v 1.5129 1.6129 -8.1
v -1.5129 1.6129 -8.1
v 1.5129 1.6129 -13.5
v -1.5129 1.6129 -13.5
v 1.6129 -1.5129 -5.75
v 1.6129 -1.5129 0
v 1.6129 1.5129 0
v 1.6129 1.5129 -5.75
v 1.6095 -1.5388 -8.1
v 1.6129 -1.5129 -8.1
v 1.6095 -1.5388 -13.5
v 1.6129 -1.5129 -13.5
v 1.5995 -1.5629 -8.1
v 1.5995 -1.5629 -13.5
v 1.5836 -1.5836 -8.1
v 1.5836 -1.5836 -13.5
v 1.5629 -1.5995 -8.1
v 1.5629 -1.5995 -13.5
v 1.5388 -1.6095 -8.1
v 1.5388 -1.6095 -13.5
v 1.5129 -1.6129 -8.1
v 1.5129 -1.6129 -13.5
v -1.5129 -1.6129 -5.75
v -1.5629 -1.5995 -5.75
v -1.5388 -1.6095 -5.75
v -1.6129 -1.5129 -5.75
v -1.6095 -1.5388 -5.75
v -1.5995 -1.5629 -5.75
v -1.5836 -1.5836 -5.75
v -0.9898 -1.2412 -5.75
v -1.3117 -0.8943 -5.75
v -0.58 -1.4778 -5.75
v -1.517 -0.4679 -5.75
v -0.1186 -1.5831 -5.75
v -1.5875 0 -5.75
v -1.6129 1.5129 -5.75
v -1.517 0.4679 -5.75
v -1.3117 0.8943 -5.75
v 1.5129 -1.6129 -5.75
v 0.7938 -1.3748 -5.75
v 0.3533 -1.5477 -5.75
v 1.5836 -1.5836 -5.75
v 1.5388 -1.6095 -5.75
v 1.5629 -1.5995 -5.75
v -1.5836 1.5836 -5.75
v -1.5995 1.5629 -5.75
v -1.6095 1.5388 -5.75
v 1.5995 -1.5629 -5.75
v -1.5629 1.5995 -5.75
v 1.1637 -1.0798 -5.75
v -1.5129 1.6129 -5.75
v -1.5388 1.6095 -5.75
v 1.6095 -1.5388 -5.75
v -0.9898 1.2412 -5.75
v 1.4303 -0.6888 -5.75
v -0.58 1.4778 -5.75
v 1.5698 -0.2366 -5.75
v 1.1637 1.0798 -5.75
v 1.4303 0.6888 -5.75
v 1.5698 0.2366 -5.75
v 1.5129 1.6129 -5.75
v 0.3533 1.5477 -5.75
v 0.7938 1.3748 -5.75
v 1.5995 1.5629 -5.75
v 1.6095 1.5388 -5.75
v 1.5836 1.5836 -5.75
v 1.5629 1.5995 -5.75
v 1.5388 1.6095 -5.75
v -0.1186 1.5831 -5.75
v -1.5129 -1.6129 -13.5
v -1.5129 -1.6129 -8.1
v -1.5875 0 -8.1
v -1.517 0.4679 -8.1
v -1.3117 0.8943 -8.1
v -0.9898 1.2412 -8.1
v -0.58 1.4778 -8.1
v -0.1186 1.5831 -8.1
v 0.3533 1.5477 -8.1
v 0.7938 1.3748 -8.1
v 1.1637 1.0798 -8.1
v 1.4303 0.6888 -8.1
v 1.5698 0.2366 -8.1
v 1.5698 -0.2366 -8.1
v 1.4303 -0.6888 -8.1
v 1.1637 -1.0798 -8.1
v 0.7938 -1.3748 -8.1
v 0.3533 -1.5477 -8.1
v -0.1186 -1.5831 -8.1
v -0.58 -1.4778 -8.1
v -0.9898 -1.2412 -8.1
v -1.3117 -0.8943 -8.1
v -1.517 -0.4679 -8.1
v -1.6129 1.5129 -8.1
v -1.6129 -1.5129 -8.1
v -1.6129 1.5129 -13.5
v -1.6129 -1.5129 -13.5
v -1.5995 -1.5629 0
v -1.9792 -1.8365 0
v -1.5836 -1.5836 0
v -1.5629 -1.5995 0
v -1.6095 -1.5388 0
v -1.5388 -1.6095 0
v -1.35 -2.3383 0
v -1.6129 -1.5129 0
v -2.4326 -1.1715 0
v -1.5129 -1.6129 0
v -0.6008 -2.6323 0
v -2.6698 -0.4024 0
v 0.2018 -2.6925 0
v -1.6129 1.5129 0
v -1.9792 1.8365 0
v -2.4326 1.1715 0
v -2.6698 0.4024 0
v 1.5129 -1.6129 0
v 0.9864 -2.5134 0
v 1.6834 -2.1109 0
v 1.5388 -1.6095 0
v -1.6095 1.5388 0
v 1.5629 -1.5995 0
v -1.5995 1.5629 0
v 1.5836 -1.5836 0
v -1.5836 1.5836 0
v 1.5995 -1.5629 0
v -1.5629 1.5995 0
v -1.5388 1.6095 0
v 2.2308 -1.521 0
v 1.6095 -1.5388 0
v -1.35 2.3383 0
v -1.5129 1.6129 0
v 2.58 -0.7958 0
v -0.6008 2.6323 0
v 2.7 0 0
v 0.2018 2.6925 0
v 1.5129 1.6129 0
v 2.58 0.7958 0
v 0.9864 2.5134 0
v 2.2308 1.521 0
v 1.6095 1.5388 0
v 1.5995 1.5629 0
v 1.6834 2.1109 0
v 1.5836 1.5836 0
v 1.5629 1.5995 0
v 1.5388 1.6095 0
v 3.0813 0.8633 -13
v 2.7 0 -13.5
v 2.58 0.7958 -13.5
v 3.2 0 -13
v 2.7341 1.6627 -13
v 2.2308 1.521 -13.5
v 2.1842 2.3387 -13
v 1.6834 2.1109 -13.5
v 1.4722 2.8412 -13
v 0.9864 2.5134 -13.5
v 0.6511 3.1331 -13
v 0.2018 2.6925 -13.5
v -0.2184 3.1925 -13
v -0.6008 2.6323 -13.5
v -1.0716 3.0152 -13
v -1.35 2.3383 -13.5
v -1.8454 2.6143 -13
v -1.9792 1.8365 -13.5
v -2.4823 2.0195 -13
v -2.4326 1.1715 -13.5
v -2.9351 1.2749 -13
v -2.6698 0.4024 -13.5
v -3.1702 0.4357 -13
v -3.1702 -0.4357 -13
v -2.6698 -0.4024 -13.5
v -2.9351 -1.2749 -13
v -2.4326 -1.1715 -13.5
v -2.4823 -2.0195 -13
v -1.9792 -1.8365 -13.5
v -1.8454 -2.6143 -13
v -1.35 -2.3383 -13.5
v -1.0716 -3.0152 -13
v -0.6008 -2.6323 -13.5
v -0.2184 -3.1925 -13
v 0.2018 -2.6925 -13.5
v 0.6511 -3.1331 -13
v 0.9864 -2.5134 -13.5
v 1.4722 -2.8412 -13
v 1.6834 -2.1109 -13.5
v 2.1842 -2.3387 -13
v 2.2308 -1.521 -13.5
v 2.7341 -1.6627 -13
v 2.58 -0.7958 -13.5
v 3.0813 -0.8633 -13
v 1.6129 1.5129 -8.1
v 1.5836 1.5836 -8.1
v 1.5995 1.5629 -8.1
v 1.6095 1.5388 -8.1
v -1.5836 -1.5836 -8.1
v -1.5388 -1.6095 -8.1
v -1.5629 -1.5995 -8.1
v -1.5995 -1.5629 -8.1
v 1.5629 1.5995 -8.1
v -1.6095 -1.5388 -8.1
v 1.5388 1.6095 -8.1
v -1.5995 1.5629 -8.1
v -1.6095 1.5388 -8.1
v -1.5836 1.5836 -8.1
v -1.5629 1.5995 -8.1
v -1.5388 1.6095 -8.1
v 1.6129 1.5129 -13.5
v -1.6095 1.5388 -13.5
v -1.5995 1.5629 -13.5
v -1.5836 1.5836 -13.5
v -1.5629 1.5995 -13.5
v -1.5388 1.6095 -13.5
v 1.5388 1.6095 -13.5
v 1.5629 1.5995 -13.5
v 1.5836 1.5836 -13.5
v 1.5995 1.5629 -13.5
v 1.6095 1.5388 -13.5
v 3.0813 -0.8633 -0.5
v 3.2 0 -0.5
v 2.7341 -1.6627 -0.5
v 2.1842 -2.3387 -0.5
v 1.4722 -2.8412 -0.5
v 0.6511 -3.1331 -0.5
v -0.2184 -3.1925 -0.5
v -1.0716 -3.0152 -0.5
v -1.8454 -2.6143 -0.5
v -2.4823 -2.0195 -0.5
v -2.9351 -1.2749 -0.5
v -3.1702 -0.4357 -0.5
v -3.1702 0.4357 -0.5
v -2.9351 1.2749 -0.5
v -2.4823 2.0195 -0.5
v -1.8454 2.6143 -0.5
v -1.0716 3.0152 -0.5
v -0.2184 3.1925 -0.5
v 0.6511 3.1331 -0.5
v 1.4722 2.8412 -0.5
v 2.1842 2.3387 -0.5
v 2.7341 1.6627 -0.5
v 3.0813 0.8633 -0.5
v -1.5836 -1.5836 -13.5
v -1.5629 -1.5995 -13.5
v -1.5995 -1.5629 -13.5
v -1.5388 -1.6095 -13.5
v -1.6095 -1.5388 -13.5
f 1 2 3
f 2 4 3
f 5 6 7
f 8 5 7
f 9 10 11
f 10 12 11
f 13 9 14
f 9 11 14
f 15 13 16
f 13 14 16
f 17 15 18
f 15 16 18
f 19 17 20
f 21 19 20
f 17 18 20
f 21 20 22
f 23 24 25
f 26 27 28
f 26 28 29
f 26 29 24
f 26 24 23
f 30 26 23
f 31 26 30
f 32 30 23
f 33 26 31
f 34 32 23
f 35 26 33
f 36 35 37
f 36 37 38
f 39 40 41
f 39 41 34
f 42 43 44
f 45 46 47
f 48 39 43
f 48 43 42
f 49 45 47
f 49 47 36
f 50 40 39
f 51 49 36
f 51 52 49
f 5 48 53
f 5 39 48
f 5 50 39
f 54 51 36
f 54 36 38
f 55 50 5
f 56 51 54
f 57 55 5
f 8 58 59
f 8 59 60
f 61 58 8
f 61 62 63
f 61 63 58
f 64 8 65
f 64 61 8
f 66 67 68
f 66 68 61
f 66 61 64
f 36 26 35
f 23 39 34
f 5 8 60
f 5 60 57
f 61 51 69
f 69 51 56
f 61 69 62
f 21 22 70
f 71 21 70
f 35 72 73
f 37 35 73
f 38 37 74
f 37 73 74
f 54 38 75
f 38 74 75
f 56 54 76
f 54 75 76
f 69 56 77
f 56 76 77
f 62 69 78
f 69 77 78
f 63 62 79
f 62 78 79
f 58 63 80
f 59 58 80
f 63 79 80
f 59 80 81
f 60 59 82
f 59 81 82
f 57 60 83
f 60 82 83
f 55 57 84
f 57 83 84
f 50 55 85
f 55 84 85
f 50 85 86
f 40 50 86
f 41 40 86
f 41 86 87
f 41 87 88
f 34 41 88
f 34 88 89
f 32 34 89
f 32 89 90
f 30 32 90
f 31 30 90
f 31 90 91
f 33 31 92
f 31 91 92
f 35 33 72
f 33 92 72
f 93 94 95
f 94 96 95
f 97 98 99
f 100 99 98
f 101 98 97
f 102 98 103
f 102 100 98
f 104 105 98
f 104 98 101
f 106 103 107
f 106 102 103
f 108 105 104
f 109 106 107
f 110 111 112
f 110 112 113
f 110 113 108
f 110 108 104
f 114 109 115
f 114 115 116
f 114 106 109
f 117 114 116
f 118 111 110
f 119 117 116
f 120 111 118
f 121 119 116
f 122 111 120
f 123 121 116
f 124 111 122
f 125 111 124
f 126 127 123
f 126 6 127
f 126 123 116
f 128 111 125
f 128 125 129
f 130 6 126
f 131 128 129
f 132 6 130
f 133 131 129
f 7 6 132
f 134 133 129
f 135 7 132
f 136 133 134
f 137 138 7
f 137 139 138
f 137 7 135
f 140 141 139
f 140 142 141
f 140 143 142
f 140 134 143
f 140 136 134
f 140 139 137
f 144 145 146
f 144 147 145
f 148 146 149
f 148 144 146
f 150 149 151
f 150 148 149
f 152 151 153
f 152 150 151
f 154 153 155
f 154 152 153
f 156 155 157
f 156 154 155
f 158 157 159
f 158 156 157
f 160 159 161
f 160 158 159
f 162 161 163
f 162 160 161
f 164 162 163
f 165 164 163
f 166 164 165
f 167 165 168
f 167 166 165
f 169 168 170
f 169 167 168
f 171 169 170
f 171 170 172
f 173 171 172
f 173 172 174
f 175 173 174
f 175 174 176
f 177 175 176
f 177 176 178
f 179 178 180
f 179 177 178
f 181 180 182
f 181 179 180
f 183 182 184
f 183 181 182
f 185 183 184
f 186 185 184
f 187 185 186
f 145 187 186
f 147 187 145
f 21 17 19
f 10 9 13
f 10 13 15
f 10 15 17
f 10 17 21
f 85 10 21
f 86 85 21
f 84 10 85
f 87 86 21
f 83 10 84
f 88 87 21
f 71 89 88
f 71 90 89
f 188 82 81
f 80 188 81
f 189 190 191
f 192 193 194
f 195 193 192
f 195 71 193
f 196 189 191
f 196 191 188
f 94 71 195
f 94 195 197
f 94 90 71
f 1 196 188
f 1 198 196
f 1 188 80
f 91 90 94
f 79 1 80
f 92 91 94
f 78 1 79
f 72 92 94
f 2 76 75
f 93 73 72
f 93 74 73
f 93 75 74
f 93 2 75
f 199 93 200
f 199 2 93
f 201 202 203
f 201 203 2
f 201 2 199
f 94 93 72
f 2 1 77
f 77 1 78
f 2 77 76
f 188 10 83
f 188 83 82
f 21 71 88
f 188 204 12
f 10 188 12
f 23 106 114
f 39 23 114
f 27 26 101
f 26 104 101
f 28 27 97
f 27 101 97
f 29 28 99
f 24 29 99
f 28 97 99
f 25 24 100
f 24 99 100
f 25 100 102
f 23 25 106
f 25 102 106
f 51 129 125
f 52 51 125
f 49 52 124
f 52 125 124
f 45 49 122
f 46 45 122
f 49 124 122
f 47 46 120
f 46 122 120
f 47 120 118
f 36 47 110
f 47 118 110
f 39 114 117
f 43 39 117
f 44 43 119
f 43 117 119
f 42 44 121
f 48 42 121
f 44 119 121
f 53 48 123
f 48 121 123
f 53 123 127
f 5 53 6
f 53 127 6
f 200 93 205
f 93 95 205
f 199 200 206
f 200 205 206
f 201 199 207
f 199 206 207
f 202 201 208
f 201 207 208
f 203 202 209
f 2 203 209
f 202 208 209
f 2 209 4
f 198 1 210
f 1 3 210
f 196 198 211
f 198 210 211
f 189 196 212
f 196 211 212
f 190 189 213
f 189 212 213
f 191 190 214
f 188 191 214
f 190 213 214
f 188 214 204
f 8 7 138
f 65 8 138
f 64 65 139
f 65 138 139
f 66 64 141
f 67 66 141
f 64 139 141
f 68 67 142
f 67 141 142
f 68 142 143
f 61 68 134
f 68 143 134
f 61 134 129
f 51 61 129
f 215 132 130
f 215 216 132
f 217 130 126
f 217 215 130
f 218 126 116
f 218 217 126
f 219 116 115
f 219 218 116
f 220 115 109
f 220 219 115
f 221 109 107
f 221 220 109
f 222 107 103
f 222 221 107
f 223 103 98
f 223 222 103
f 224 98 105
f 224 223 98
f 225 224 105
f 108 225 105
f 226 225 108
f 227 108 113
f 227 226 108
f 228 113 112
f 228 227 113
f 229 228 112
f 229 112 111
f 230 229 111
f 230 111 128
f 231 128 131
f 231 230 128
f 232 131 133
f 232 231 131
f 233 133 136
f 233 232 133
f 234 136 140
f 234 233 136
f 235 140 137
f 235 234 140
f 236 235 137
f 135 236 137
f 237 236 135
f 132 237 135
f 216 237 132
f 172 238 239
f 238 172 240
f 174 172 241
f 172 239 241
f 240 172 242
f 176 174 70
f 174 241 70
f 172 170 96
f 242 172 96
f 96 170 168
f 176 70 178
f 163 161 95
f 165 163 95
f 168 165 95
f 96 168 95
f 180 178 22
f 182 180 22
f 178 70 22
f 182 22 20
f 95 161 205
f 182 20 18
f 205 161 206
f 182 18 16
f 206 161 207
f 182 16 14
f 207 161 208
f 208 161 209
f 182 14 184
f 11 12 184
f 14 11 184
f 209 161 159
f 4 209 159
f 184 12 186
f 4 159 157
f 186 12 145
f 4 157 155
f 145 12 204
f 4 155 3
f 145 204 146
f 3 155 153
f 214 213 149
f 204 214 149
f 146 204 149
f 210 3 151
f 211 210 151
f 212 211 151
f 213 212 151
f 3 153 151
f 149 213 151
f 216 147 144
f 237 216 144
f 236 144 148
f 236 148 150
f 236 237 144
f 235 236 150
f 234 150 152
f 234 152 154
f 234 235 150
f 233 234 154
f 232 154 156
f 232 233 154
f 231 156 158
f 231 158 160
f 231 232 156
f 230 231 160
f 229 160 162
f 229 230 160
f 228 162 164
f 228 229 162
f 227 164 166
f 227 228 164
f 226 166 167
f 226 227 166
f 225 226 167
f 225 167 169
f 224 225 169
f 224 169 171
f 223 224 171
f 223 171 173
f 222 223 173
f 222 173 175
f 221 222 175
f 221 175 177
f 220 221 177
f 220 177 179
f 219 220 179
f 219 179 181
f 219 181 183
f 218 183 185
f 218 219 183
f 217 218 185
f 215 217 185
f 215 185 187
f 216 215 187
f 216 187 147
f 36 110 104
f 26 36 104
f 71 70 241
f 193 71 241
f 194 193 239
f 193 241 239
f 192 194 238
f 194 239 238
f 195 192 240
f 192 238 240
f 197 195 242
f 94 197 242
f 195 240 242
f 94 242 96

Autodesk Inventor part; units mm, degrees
ref_plane "YZ Plane" through (0, 0, 0) normal (1, 0, 0) x (0, 1, 0)
ref_plane "XZ Plane" through (0, 0, 0) normal (0, 1, 0) x (-1, 0, 0)
ref_plane "XY Plane" through (0, 0, 0) normal (0, 0, 1) x (1, 0, 0)
sketch "Sketch1" plane through (0, 0, 0) normal (0, 0, 1) x (1, 0, 0)
  circle A0 centre (0, 0) radius 3.2
  dimension "d0" = 6.4
extrude "Extrusion1" add sketch "Sketch1" against normal blind 13.5
sketch "Sketch2" plane through (0, 0, 0) normal (0, 0, 1) x (1, 0, 0)
  circle A0 centre (0, 0) radius 2.7
  line L0 (1.6129, -1.5129) -> (1.6129, 1.5129)
  arc A1 (1.5129, -1.6129) -> (1.6129, -1.5129) centre (1.5129, -1.5129) ccw
  line L1 (-1.5129, -1.6129) -> (1.5129, -1.6129)
  arc A2 (-1.6129, -1.5129) -> (-1.5129, -1.6129) centre (-1.5129, -1.5129) ccw
  line L2 (-1.6129, 1.5129) -> (-1.6129, -1.5129)
  arc A3 (-1.5129, 1.6129) -> (-1.6129, 1.5129) centre (-1.5129, 1.5129) ccw
  line L3 (1.5129, 1.6129) -> (-1.5129, 1.6129)
  arc A4 (1.6129, 1.5129) -> (1.5129, 1.6129) centre (1.5129, 1.5129) ccw
extrude "Extrusion2" cut sketch "Sketch2" against normal blind 5.75 contours A1 L1 A2 L2 A3 L3 A4 L0
sketch "Sketch3" plane through (0, 0, -13.5) normal (0, 0, -1) x (-1, 0, 0)
  circle A0 centre (0, 0) radius 2.7
  line L0 (1.6129, -1.5129) -> (1.6129, 1.5129)
  arc A1 (1.5129, -1.6129) -> (1.6129, -1.5129) centre (1.5129, -1.5129) ccw
  line L1 (-1.5129, -1.6129) -> (1.5129, -1.6129)
  arc A2 (-1.6129, -1.5129) -> (-1.5129, -1.6129) centre (-1.5129, -1.5129) ccw
  line L2 (-1.6129, 1.5129) -> (-1.6129, -1.5129)
  arc A3 (-1.5129, 1.6129) -> (-1.6129, 1.5129) centre (-1.5129, 1.5129) ccw
  line L3 (1.5129, 1.6129) -> (-1.5129, 1.6129)
  arc A4 (1.6129, 1.5129) -> (1.5129, 1.6129) centre (1.5129, 1.5129) ccw
extrude "Extrusion3" cut sketch "Sketch3" against normal blind 5.4 contours A1 L1 A2 L2 A3 L3 A4 L0
sketch "Sketch4" plane through (0, 0, -8.1) normal (0, 0, -1) x (-1, 0, 0)
  circle A0 centre (0, 0) radius 1.5875
  dimension "d7" = 3.175
extrude "Extrusion4" cut sketch "Sketch4" against normal up to next
chamfer "Chamfer1" distance 0.5 angle 45 2 edges at (-3.2, 0, -13.5) (-3.2, 0, 0)
sketch "Sketch5" plane through (0, 0, 0) normal (0, 0, 1) x (1, 0, 0)
  line L0 (1.6129, 1.5129) -> (1.6129, -1.5129) projected
  line L1 (1.5129, -1.6129) -> (-1.5129, -1.6129) projected
  line L2 (-1.6129, -1.5129) -> (-1.6129, 1.5129) projected
  line L3 (-1.5129, 1.6129) -> (1.5129, 1.6129) projected
  circle A0 centre (0, 0) radius 2.7 projected
  circle A1 centre (0, 0) radius 1.6129
surface extrude "ExtrusionSrf1" sketch "Sketch5" against normal up to surface (13.5 mm away) shown no curves A1
properties part number "276-1843" material "Steel"
